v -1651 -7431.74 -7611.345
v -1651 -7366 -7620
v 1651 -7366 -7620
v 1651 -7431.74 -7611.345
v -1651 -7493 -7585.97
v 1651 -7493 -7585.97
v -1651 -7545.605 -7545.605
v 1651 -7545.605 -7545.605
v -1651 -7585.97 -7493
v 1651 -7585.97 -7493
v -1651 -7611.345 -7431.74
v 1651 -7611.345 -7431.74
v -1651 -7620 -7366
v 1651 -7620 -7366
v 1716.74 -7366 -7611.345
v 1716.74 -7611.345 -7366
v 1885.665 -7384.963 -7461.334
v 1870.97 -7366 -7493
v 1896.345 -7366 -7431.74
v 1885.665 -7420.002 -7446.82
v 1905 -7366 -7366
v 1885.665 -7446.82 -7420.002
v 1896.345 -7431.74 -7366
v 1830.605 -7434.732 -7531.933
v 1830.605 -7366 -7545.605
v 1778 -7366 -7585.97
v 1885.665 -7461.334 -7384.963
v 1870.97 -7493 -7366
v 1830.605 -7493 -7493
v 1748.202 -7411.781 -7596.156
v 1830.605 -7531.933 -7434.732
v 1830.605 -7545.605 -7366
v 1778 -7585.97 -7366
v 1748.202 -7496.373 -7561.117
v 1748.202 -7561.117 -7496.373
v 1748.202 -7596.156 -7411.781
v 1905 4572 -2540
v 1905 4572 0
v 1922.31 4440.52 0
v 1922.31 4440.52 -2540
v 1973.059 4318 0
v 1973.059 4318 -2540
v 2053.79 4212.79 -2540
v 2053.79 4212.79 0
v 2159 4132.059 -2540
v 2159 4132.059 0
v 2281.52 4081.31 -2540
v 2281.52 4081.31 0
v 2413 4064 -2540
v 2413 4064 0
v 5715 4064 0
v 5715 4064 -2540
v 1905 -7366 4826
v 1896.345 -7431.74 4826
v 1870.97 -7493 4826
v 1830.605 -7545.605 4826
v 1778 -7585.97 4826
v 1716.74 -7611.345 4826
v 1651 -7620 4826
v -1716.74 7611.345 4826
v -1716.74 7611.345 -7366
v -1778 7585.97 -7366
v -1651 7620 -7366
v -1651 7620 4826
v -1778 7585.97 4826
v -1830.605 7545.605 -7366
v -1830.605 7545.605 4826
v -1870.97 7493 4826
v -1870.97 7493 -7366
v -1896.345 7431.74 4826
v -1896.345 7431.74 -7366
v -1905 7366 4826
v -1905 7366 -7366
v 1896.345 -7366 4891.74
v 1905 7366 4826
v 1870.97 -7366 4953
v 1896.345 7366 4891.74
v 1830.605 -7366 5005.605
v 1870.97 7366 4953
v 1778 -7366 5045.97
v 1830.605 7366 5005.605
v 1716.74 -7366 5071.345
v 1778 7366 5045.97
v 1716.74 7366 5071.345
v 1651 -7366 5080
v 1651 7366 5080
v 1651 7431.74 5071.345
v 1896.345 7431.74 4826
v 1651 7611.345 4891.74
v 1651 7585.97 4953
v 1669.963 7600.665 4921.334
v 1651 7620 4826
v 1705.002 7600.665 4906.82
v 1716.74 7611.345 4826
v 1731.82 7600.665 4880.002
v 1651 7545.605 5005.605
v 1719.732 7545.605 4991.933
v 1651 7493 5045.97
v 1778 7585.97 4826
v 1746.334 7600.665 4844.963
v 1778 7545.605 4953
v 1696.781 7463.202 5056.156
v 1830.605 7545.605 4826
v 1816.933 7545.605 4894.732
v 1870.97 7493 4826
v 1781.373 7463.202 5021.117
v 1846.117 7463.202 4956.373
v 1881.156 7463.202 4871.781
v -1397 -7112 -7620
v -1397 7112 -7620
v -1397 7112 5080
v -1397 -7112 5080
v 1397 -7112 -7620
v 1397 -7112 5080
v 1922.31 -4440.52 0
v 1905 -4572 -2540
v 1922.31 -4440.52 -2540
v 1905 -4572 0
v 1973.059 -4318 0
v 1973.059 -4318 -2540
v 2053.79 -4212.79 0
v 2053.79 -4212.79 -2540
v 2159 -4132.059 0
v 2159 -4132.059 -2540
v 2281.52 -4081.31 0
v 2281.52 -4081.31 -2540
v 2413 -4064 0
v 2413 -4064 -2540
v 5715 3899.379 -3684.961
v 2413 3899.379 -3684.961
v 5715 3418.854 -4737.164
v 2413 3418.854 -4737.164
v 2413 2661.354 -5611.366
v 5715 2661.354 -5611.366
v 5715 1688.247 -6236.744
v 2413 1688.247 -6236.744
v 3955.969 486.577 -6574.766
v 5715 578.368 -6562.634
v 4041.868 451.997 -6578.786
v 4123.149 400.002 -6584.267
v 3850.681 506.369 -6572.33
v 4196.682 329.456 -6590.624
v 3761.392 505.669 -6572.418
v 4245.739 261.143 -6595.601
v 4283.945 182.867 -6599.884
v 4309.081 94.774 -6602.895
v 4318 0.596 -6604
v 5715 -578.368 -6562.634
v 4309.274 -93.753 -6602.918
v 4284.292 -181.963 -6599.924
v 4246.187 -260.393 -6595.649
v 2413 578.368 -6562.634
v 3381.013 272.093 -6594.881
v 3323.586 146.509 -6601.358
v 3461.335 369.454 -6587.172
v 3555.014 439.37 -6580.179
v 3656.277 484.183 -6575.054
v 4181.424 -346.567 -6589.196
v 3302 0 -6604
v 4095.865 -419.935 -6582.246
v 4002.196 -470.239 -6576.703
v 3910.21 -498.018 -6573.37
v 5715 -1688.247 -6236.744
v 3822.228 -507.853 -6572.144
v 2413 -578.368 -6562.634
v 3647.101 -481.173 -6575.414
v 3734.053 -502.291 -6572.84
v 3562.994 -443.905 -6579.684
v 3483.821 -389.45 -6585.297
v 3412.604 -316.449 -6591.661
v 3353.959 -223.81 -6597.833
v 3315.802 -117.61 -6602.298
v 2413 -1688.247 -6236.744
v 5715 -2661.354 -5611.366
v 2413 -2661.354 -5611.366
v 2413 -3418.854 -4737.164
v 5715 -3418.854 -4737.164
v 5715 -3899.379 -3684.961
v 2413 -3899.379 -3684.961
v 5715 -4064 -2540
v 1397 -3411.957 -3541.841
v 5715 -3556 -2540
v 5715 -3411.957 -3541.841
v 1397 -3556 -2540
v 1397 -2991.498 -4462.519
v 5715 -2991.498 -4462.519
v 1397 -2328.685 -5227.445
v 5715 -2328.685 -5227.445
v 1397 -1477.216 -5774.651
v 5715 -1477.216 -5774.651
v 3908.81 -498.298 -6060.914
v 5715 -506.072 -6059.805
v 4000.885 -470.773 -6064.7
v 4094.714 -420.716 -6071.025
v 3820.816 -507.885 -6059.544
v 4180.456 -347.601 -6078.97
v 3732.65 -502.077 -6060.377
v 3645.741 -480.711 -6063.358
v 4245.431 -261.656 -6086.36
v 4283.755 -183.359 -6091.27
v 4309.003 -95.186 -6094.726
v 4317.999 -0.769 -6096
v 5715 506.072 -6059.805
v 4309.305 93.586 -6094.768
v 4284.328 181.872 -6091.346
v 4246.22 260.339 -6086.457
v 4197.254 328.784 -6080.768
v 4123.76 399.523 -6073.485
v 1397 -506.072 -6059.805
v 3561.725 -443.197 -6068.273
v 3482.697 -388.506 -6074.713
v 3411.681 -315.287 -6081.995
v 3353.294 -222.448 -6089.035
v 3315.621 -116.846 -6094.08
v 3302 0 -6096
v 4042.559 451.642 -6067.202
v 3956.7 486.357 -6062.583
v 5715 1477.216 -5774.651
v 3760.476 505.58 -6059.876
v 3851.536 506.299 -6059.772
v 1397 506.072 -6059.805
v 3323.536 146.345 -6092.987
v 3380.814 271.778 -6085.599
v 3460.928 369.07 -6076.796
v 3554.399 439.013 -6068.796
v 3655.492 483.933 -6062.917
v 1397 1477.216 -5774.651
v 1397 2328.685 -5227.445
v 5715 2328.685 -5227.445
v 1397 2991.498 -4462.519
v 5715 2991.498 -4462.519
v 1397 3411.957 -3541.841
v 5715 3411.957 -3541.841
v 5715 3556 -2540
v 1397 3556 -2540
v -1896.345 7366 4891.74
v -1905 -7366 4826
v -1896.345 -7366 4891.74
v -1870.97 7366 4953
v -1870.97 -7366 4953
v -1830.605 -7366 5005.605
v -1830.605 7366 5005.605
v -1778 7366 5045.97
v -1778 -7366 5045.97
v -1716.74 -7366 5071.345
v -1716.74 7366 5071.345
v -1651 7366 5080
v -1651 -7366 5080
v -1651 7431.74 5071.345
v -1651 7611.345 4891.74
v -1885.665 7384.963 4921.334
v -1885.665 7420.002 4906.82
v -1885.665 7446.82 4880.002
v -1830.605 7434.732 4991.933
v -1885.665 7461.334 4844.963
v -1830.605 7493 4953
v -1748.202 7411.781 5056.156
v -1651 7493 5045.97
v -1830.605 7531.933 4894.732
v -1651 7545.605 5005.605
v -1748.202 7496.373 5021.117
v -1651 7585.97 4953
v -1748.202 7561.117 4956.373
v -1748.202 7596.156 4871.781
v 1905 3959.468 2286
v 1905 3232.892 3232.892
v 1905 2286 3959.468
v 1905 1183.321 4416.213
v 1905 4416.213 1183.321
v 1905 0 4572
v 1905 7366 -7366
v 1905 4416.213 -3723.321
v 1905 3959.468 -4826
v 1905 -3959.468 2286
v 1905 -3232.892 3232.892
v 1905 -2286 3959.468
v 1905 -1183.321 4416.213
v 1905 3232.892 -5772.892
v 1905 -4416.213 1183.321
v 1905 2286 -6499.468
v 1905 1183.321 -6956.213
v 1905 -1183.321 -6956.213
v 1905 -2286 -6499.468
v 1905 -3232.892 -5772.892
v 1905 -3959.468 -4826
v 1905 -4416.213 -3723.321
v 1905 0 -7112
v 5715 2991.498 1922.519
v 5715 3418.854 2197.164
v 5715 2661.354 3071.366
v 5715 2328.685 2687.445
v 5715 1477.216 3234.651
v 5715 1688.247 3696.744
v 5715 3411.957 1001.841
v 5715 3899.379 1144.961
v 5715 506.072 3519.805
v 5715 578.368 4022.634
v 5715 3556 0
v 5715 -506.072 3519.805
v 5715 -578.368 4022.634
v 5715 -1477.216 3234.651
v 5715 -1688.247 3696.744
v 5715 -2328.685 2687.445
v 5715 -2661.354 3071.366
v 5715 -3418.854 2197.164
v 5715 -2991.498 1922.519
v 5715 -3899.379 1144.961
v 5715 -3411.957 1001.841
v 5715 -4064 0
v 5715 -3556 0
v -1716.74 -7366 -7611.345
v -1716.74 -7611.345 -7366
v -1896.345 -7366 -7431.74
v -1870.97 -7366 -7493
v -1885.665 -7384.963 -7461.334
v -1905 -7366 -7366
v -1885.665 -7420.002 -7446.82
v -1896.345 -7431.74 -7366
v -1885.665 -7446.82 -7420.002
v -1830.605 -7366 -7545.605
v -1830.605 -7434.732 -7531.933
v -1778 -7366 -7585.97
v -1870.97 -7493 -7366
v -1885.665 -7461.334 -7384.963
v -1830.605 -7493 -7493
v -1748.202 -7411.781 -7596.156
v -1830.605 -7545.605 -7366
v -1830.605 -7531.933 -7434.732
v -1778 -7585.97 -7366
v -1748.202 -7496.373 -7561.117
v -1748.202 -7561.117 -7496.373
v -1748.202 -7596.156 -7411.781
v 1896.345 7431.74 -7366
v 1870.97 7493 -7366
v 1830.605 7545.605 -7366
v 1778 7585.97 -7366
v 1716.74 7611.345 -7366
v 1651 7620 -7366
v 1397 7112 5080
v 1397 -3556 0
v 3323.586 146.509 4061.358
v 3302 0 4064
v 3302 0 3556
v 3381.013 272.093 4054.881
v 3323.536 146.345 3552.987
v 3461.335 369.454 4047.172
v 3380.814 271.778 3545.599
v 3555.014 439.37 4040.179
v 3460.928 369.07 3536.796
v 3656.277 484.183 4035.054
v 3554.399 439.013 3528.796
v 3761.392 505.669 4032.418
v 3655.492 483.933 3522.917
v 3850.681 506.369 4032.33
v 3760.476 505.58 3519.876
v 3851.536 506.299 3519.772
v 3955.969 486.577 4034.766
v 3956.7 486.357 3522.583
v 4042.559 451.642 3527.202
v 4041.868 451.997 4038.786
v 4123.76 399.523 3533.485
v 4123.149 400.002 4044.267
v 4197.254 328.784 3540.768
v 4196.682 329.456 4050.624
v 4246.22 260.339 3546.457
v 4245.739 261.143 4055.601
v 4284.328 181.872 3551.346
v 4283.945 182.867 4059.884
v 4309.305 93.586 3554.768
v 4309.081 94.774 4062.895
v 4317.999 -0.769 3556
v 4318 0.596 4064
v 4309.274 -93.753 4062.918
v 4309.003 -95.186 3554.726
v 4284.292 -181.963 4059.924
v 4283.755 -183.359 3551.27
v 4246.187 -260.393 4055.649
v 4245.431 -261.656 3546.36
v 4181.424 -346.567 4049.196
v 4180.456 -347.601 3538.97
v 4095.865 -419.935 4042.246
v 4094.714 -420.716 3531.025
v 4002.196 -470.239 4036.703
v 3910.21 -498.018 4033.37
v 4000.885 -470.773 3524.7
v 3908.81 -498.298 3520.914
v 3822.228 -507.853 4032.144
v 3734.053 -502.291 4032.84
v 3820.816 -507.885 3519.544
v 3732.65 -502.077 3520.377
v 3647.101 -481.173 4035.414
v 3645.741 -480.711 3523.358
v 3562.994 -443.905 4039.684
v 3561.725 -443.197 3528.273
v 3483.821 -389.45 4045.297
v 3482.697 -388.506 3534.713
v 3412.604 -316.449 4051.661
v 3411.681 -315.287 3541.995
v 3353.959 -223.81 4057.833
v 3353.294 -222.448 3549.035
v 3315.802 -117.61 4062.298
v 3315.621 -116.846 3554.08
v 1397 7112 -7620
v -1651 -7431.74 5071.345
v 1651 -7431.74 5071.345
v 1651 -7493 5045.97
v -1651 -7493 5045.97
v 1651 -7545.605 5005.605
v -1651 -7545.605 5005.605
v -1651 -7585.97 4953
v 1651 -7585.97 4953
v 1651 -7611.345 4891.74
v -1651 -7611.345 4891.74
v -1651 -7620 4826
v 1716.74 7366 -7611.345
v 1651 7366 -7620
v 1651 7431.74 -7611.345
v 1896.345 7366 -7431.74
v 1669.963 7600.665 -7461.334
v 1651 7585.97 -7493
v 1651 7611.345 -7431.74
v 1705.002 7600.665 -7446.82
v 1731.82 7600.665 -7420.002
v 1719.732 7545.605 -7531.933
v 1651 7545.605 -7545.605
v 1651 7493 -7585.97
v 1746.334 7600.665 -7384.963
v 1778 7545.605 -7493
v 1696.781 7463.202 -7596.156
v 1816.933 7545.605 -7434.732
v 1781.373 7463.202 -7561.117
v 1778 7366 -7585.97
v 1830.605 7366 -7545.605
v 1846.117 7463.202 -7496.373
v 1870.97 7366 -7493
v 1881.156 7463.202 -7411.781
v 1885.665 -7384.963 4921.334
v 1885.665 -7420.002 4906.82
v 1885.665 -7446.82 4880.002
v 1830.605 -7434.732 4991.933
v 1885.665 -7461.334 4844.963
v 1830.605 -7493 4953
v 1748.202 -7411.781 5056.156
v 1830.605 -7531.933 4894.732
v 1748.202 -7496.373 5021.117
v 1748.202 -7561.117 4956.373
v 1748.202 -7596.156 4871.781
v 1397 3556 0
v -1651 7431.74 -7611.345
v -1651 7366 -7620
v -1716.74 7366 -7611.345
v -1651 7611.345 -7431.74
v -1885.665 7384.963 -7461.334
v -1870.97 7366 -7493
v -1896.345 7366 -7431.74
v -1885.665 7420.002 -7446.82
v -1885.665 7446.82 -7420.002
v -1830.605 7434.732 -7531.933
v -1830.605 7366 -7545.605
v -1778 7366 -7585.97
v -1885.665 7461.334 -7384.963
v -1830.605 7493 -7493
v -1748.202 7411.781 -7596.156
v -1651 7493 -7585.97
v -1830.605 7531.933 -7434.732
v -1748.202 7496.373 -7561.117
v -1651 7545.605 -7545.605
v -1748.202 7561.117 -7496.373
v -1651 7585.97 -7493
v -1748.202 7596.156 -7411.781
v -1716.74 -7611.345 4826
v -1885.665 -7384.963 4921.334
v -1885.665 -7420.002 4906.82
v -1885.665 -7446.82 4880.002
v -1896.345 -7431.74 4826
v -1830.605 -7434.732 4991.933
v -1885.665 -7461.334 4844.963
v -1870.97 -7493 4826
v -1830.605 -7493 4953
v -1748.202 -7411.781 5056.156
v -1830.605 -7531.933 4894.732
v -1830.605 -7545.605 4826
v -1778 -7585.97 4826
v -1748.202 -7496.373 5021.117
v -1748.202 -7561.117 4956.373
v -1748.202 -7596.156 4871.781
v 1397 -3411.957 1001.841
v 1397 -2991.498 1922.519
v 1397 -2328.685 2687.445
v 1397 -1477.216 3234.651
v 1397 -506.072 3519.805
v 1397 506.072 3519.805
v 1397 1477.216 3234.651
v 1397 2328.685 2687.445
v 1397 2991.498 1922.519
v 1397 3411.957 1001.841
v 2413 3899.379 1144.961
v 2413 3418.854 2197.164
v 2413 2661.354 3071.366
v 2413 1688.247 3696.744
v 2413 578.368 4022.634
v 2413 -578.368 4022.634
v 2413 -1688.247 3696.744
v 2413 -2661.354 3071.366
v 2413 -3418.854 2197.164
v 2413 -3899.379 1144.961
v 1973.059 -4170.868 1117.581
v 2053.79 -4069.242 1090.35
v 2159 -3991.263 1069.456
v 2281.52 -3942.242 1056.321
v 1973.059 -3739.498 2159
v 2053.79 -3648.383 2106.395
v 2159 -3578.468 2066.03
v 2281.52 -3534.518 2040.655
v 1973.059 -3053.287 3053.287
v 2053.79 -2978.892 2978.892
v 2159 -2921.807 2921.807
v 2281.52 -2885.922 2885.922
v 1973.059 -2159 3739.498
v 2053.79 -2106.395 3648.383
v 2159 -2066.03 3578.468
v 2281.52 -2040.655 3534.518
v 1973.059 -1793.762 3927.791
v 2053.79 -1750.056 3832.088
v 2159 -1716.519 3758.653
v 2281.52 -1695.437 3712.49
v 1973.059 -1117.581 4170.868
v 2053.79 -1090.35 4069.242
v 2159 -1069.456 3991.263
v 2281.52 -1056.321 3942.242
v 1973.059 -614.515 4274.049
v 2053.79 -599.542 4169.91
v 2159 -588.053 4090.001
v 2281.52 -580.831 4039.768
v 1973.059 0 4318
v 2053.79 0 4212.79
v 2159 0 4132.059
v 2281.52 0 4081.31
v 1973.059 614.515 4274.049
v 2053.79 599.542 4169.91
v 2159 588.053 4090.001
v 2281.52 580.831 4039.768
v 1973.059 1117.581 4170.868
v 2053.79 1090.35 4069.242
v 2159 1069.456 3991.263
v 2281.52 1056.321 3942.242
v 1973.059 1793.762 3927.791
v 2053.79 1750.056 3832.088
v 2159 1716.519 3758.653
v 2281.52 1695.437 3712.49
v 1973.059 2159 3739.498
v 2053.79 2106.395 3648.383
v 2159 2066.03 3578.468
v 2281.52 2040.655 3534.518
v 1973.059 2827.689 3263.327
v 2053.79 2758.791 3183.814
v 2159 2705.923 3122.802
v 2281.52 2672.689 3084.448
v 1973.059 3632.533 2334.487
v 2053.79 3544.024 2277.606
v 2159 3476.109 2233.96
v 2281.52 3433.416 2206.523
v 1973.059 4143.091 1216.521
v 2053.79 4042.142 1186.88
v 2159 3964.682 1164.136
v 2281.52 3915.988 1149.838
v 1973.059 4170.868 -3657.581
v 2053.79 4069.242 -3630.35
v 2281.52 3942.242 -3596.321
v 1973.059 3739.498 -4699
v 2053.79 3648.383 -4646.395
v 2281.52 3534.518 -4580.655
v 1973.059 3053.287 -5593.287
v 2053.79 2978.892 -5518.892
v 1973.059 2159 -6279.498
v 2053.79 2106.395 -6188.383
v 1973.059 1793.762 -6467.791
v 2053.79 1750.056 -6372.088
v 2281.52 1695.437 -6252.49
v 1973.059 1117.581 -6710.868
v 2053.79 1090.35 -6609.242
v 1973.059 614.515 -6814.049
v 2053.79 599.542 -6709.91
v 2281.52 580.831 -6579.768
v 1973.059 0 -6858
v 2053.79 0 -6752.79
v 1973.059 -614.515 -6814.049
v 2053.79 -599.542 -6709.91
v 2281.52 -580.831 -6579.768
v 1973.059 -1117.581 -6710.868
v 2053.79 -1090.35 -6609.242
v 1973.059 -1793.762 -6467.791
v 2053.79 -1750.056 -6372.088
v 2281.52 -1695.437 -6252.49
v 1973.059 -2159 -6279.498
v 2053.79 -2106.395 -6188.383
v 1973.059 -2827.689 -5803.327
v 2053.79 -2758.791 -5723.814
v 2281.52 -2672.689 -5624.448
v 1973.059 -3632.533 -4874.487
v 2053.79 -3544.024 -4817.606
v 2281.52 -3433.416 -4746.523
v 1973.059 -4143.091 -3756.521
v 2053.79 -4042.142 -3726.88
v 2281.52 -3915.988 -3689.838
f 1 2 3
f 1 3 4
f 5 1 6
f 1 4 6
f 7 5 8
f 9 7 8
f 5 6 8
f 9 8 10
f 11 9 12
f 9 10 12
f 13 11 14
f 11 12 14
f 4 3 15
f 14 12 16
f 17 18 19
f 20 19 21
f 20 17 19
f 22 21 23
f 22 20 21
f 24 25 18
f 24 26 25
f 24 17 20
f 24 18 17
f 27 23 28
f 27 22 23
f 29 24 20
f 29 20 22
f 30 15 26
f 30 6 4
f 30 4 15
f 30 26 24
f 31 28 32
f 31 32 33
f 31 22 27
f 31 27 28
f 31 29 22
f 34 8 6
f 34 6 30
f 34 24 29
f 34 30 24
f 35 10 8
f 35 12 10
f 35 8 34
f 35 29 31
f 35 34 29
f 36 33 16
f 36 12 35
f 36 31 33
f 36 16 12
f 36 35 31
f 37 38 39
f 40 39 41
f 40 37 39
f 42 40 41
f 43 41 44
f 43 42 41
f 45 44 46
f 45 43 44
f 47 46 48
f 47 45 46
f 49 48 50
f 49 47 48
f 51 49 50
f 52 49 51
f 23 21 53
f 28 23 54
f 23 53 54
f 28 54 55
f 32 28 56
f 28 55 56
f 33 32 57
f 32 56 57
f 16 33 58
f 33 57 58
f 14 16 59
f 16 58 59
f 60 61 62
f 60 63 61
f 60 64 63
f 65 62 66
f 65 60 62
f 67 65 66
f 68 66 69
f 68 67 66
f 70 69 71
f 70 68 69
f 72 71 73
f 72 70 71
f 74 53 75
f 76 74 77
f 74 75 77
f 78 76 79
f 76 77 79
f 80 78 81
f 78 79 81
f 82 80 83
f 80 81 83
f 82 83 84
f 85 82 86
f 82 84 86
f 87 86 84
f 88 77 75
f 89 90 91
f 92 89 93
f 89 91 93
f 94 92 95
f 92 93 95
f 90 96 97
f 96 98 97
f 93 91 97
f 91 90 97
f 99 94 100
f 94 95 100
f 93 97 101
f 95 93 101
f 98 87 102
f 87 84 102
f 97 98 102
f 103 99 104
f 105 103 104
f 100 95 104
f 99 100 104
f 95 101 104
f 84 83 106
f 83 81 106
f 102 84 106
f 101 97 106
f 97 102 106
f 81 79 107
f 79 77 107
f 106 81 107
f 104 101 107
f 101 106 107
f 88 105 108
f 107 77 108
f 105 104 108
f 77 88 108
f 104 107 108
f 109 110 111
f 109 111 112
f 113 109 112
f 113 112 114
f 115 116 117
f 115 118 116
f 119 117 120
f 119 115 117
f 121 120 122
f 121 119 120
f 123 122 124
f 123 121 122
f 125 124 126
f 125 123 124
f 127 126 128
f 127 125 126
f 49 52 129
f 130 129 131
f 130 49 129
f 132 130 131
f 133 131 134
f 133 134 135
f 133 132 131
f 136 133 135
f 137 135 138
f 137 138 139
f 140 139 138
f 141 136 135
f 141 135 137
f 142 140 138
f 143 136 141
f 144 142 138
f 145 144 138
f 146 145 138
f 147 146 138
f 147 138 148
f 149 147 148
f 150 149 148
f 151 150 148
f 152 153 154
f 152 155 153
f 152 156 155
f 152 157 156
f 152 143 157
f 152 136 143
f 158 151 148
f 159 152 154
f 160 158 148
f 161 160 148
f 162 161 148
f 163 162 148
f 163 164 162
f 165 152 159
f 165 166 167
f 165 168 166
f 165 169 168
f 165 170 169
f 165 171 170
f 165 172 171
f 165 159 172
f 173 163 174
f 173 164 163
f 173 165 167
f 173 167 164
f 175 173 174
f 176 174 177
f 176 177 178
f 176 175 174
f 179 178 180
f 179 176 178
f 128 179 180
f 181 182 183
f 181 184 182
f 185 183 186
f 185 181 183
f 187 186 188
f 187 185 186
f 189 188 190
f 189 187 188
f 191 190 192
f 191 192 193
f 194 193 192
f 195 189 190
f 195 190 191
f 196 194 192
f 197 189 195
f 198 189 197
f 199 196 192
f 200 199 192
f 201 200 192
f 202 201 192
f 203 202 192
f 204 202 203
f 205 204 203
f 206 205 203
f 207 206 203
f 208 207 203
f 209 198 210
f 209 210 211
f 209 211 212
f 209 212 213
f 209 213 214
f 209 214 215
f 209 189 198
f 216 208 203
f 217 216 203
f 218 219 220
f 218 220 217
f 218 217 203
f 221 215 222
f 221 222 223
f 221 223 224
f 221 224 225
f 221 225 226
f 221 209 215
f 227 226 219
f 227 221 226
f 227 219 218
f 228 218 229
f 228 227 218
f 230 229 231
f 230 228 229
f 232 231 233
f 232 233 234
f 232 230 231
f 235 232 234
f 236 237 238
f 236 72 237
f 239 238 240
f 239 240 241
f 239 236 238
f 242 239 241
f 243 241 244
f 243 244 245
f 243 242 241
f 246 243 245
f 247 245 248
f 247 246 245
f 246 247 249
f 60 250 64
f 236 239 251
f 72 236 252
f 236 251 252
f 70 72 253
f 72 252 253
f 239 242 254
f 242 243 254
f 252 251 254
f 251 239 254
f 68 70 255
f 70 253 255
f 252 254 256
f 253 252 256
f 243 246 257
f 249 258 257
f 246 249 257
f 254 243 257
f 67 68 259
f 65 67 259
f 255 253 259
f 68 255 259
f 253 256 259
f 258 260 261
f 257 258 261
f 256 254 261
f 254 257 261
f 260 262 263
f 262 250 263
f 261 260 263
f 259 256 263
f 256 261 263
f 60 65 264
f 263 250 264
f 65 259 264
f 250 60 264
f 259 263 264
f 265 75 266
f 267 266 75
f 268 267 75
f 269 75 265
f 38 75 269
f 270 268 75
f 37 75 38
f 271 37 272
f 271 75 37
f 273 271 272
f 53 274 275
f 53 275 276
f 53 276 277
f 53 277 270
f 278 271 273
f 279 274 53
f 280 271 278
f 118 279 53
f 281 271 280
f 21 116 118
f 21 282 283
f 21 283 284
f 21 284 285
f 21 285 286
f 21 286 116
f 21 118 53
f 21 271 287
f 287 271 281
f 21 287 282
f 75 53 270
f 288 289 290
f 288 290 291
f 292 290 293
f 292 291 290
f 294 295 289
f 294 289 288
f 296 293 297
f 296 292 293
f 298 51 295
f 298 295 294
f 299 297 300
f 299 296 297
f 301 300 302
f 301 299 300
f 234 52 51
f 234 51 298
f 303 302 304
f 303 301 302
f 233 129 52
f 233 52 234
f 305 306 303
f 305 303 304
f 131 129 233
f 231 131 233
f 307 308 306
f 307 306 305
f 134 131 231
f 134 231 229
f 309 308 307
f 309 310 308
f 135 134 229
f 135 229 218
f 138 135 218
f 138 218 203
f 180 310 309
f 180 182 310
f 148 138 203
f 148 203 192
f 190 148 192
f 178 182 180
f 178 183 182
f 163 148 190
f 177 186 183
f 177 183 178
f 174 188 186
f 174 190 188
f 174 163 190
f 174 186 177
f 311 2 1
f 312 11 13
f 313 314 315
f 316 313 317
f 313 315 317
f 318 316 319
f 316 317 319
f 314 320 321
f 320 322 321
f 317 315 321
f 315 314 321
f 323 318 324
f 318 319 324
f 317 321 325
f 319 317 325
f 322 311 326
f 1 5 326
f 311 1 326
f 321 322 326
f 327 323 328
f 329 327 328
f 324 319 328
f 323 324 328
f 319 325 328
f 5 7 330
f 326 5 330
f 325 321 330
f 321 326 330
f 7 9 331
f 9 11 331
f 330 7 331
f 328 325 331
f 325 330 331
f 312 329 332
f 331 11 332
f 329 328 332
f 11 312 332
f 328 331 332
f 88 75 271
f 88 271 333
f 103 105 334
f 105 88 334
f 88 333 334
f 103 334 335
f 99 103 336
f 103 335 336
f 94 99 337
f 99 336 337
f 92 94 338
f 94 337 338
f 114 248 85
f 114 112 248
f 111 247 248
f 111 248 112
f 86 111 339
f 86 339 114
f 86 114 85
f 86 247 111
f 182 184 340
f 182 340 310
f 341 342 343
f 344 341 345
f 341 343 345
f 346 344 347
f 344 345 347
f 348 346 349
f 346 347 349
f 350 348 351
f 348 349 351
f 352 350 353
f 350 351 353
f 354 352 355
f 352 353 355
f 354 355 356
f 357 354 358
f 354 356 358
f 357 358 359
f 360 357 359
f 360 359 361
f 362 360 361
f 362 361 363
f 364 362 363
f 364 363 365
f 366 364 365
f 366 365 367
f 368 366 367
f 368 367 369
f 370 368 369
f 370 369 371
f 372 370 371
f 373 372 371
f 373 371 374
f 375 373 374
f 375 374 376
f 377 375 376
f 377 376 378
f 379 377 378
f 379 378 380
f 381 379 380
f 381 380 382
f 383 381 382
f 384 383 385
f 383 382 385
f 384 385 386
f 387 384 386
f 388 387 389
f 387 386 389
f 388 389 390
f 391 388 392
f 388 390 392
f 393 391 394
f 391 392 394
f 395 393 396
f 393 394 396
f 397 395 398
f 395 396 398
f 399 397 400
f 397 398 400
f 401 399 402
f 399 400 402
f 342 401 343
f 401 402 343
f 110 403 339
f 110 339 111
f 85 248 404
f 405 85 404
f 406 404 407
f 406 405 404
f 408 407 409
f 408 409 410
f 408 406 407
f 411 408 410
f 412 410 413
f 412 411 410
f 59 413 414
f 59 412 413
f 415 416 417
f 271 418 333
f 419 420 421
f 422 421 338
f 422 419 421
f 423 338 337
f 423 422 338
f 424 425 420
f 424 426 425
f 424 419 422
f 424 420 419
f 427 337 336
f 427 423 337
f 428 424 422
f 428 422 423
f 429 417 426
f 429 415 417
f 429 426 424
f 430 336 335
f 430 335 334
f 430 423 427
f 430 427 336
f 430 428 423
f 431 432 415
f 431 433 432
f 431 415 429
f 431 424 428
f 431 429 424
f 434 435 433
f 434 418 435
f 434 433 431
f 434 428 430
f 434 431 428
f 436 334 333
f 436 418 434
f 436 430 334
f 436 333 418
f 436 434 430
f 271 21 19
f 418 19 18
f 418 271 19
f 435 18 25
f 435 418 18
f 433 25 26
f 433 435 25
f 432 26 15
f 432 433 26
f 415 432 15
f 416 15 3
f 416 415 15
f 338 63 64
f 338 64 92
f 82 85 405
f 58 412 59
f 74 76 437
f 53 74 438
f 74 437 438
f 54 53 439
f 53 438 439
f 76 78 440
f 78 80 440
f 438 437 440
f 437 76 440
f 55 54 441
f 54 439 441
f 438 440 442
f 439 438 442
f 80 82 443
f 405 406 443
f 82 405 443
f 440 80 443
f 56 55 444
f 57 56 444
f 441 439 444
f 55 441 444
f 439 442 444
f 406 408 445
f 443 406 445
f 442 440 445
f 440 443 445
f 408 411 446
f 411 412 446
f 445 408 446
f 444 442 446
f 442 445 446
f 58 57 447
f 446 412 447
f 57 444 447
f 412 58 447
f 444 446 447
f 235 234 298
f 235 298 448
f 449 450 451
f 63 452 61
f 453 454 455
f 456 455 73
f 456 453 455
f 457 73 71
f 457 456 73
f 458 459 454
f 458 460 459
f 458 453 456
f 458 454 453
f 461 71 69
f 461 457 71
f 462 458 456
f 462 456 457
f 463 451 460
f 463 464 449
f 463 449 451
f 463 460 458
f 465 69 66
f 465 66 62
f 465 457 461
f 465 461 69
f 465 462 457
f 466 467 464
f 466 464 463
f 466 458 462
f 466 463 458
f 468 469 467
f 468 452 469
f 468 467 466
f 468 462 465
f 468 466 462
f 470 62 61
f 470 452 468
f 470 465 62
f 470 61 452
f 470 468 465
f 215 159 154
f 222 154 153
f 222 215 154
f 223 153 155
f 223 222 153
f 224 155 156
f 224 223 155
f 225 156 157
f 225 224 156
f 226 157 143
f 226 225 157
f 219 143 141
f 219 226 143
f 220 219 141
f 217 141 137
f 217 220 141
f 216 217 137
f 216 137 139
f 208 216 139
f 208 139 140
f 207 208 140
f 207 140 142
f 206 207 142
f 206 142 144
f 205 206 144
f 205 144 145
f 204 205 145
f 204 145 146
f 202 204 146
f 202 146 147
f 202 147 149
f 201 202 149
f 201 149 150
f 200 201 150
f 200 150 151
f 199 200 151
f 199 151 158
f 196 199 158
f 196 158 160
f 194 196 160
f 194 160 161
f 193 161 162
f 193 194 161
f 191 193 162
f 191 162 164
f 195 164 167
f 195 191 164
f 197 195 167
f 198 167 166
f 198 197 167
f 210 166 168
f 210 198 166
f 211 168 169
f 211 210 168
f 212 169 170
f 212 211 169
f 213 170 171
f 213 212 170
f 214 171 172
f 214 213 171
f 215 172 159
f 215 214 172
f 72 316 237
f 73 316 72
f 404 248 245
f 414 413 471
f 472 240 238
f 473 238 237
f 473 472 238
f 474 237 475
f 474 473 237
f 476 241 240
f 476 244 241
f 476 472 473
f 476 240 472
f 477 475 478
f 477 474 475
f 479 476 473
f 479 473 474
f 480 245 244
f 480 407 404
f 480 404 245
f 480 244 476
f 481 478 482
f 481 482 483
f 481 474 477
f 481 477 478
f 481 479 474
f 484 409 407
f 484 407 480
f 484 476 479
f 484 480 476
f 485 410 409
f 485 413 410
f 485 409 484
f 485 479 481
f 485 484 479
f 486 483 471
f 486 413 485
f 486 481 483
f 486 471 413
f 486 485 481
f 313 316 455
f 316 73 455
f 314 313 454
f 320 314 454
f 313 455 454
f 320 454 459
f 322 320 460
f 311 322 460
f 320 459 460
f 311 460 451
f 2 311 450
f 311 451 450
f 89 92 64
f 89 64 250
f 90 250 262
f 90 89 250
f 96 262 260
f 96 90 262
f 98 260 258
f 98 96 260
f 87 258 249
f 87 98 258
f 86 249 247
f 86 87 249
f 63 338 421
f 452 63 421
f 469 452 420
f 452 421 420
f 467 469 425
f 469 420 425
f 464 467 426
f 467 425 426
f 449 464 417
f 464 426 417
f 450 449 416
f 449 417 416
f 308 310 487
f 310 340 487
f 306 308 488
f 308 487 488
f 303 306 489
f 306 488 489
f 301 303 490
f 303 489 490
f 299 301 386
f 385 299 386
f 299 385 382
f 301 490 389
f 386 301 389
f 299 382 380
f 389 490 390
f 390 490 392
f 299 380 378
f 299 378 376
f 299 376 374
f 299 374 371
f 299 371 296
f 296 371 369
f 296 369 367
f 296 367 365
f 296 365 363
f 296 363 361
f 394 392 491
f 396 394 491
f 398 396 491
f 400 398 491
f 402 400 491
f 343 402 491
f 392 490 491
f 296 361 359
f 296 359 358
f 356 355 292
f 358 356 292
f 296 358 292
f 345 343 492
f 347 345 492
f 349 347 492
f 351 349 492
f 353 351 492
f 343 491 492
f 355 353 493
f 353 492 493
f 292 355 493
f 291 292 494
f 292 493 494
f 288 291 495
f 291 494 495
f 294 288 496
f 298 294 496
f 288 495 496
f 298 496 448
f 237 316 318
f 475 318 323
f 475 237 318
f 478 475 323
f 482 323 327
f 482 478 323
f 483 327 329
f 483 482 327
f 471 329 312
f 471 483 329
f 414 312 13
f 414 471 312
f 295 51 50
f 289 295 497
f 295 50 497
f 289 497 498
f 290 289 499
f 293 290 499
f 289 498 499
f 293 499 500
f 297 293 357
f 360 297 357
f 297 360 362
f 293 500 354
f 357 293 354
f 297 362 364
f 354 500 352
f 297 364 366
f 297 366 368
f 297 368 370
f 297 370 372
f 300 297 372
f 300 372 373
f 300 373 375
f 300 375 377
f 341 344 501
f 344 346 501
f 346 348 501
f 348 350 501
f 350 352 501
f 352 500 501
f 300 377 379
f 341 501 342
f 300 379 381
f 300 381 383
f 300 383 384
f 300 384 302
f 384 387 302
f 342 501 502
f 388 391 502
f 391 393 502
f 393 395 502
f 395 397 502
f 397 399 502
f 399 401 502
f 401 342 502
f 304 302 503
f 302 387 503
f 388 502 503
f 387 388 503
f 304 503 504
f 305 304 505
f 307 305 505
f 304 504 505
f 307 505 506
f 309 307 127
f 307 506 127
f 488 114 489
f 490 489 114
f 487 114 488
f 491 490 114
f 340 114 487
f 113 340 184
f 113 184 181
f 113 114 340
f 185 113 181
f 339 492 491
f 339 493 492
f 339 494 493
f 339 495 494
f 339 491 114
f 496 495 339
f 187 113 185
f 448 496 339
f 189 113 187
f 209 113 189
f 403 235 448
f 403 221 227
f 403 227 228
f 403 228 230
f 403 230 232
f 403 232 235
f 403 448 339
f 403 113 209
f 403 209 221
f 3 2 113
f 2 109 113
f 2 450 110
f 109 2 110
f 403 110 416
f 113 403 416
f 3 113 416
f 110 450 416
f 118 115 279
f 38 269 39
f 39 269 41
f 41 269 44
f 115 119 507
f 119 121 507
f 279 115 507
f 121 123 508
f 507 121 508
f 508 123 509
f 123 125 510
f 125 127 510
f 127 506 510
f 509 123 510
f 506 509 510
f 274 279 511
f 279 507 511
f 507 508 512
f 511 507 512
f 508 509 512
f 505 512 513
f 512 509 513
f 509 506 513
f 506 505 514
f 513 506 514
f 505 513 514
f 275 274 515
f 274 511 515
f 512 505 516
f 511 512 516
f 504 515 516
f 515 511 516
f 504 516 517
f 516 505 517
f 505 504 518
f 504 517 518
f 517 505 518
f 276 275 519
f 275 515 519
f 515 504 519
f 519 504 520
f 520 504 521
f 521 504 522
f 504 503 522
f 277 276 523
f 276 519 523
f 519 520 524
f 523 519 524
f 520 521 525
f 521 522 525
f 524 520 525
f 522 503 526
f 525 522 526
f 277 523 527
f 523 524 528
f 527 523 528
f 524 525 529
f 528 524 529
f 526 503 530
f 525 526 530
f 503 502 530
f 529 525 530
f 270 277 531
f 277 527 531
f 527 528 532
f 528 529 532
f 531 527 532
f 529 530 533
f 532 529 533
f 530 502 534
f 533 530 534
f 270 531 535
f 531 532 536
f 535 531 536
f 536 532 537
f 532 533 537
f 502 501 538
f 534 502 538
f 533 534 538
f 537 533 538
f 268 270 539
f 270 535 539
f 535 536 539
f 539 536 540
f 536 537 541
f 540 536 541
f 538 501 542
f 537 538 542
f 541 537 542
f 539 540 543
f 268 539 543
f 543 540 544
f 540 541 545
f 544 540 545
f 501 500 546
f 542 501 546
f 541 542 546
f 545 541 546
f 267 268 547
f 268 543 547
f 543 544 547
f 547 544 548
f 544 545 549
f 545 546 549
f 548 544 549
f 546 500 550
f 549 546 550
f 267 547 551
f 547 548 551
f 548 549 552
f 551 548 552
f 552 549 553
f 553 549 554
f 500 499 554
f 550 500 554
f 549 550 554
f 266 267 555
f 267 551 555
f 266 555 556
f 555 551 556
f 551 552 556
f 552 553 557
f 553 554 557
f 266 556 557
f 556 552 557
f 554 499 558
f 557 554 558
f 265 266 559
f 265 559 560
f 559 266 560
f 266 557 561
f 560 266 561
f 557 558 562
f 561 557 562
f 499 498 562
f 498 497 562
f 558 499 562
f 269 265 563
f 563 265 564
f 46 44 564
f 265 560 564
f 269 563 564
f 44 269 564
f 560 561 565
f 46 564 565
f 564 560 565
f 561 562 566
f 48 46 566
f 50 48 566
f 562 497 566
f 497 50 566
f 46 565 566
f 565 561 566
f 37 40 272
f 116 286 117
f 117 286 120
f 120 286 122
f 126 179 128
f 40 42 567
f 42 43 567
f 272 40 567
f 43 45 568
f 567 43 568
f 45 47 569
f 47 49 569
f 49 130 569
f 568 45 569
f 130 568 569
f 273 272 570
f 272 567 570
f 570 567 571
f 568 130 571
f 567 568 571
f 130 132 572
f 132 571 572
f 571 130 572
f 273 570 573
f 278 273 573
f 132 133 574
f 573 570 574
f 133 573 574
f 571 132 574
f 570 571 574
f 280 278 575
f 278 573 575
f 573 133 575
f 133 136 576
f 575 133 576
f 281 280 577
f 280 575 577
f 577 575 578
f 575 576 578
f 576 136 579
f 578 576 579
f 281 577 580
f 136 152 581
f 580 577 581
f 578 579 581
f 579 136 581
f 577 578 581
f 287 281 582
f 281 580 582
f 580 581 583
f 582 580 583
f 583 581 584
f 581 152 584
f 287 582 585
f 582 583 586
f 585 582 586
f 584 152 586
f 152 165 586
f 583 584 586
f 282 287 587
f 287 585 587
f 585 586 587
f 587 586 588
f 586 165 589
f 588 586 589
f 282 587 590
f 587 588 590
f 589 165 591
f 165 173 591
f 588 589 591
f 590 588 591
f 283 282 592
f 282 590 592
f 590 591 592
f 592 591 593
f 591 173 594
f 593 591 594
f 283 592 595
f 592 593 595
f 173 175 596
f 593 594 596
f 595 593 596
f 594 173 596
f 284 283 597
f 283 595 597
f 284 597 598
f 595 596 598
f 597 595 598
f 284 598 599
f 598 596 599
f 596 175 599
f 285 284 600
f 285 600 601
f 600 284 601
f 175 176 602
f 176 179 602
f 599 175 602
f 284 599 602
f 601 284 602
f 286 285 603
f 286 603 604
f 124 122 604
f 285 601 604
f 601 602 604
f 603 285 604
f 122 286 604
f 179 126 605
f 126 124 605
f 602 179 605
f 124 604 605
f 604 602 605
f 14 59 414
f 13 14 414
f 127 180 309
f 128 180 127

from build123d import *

# Parameters (mm, degrees)
F3_W     = 3810
F3_H     = 15240
F3_W_2   = 2794
F3_H_2   = 14224
F4_DEPTH = 5080
F6_DEPTH = 3810
F7_DEPTH = 508
F9_DEPTH = 1270
F10_R    = 254
F14_D    = 1016
F16_R    = 508


# Not quite as in the source:
# - a variable given as a bare number and used for a length is read in inches; the dataset says mm whatever the document's units were


with BuildPart() as f4:
    # F3 (on Top) → F4 (new body)
    with BuildSketch(Plane.XY):
        Rectangle(F3_W, F3_H)
        Rectangle(F3_W_2, F3_H_2, mode=Mode.SUBTRACT)
    extrude(amount=F4_DEPTH)

    # F5 (on face) → F6 (join)
    with BuildSketch(Plane.YZ.offset(1905)):
        with BuildLine():
            Line((3556, 0), (4064, 0))
            ThreePointArc((4064, 0), (0, 4064), (-4064, 0))
            Line((-4064, 0), (-3556, 0))
            ThreePointArc((-3556, 0), (0, 3556), (3556, 0))
        make_face()
    extrude(amount=F6_DEPTH)

    # F7 (cut, through all): a face of the model
    f7_faces = [f4.faces().sort_by_distance(p)[0] for p in [
        (1905, 0, 1509.2132736927),
    ]]
    extrude(f7_faces, amount=-F7_DEPTH, mode=Mode.SUBTRACT)

    # F8 (on face) → F9 (join)
    with BuildSketch(Plane(origin=(0, 0, 0), x_dir=(1, 0, 0), z_dir=(0, 0, -1))):
        Polygon((1905, 4064), (1905, 7620), (-1905, 7620), (-1905, -7620), (1905, -7620), (1905, -4064), (5715, -4064), (5715, -3556), (1397, -3556), (1397, -7112), (-1397, -7112), (-1397, 7112), (1397, 7112), (1397, 3556), (5715, 3556), (5715, 4064), align=None)
    extrude(amount=F9_DEPTH)

    # F10
    f10_edges = [f4.edges().sort_by_distance(p)[0] for p in [
        (0, -7620, 5080),
        (1905, 0, 5080),
        (0, 7620, 5080),
        (-1905, 0, 5080),
        (1905, -7620, 1905),
        (1905, 7620, 1905),
        (-1905, -7620, 1905),
        (-1905, 7620, 1905),
    ]]
    fillet(f10_edges, radius=F10_R)

    # F14 (through all)
    with Locations(Plane.XY.offset(4064)):
        with Locations((3810, 0)):
            Hole(F14_D / 2)

    # F15: F4 across face


with BuildPart() as f4_1:
    add(f4.part)
    add(f4.part.mirror(Plane(origin=(474.1354212806, 0, -1270), x_dir=(1, 0, 0), z_dir=(0, 0, -1))))

    # F16
    f16_edges = [f4_1.edges().sort_by_distance(p)[0] for p in [
        (1905, -7366, -1270),
        (1905, 0, 4826),
        (1905, 7366, -1270),
        (1905, 0, -7366),
        (1905, -4064, -1270),
        (1905, 0, -6604),
        (1905, 4064, -1270),
        (1905, 0, 4064),
    ]]
    fillet(f16_edges, radius=F16_R)


solid = f4_1.part
